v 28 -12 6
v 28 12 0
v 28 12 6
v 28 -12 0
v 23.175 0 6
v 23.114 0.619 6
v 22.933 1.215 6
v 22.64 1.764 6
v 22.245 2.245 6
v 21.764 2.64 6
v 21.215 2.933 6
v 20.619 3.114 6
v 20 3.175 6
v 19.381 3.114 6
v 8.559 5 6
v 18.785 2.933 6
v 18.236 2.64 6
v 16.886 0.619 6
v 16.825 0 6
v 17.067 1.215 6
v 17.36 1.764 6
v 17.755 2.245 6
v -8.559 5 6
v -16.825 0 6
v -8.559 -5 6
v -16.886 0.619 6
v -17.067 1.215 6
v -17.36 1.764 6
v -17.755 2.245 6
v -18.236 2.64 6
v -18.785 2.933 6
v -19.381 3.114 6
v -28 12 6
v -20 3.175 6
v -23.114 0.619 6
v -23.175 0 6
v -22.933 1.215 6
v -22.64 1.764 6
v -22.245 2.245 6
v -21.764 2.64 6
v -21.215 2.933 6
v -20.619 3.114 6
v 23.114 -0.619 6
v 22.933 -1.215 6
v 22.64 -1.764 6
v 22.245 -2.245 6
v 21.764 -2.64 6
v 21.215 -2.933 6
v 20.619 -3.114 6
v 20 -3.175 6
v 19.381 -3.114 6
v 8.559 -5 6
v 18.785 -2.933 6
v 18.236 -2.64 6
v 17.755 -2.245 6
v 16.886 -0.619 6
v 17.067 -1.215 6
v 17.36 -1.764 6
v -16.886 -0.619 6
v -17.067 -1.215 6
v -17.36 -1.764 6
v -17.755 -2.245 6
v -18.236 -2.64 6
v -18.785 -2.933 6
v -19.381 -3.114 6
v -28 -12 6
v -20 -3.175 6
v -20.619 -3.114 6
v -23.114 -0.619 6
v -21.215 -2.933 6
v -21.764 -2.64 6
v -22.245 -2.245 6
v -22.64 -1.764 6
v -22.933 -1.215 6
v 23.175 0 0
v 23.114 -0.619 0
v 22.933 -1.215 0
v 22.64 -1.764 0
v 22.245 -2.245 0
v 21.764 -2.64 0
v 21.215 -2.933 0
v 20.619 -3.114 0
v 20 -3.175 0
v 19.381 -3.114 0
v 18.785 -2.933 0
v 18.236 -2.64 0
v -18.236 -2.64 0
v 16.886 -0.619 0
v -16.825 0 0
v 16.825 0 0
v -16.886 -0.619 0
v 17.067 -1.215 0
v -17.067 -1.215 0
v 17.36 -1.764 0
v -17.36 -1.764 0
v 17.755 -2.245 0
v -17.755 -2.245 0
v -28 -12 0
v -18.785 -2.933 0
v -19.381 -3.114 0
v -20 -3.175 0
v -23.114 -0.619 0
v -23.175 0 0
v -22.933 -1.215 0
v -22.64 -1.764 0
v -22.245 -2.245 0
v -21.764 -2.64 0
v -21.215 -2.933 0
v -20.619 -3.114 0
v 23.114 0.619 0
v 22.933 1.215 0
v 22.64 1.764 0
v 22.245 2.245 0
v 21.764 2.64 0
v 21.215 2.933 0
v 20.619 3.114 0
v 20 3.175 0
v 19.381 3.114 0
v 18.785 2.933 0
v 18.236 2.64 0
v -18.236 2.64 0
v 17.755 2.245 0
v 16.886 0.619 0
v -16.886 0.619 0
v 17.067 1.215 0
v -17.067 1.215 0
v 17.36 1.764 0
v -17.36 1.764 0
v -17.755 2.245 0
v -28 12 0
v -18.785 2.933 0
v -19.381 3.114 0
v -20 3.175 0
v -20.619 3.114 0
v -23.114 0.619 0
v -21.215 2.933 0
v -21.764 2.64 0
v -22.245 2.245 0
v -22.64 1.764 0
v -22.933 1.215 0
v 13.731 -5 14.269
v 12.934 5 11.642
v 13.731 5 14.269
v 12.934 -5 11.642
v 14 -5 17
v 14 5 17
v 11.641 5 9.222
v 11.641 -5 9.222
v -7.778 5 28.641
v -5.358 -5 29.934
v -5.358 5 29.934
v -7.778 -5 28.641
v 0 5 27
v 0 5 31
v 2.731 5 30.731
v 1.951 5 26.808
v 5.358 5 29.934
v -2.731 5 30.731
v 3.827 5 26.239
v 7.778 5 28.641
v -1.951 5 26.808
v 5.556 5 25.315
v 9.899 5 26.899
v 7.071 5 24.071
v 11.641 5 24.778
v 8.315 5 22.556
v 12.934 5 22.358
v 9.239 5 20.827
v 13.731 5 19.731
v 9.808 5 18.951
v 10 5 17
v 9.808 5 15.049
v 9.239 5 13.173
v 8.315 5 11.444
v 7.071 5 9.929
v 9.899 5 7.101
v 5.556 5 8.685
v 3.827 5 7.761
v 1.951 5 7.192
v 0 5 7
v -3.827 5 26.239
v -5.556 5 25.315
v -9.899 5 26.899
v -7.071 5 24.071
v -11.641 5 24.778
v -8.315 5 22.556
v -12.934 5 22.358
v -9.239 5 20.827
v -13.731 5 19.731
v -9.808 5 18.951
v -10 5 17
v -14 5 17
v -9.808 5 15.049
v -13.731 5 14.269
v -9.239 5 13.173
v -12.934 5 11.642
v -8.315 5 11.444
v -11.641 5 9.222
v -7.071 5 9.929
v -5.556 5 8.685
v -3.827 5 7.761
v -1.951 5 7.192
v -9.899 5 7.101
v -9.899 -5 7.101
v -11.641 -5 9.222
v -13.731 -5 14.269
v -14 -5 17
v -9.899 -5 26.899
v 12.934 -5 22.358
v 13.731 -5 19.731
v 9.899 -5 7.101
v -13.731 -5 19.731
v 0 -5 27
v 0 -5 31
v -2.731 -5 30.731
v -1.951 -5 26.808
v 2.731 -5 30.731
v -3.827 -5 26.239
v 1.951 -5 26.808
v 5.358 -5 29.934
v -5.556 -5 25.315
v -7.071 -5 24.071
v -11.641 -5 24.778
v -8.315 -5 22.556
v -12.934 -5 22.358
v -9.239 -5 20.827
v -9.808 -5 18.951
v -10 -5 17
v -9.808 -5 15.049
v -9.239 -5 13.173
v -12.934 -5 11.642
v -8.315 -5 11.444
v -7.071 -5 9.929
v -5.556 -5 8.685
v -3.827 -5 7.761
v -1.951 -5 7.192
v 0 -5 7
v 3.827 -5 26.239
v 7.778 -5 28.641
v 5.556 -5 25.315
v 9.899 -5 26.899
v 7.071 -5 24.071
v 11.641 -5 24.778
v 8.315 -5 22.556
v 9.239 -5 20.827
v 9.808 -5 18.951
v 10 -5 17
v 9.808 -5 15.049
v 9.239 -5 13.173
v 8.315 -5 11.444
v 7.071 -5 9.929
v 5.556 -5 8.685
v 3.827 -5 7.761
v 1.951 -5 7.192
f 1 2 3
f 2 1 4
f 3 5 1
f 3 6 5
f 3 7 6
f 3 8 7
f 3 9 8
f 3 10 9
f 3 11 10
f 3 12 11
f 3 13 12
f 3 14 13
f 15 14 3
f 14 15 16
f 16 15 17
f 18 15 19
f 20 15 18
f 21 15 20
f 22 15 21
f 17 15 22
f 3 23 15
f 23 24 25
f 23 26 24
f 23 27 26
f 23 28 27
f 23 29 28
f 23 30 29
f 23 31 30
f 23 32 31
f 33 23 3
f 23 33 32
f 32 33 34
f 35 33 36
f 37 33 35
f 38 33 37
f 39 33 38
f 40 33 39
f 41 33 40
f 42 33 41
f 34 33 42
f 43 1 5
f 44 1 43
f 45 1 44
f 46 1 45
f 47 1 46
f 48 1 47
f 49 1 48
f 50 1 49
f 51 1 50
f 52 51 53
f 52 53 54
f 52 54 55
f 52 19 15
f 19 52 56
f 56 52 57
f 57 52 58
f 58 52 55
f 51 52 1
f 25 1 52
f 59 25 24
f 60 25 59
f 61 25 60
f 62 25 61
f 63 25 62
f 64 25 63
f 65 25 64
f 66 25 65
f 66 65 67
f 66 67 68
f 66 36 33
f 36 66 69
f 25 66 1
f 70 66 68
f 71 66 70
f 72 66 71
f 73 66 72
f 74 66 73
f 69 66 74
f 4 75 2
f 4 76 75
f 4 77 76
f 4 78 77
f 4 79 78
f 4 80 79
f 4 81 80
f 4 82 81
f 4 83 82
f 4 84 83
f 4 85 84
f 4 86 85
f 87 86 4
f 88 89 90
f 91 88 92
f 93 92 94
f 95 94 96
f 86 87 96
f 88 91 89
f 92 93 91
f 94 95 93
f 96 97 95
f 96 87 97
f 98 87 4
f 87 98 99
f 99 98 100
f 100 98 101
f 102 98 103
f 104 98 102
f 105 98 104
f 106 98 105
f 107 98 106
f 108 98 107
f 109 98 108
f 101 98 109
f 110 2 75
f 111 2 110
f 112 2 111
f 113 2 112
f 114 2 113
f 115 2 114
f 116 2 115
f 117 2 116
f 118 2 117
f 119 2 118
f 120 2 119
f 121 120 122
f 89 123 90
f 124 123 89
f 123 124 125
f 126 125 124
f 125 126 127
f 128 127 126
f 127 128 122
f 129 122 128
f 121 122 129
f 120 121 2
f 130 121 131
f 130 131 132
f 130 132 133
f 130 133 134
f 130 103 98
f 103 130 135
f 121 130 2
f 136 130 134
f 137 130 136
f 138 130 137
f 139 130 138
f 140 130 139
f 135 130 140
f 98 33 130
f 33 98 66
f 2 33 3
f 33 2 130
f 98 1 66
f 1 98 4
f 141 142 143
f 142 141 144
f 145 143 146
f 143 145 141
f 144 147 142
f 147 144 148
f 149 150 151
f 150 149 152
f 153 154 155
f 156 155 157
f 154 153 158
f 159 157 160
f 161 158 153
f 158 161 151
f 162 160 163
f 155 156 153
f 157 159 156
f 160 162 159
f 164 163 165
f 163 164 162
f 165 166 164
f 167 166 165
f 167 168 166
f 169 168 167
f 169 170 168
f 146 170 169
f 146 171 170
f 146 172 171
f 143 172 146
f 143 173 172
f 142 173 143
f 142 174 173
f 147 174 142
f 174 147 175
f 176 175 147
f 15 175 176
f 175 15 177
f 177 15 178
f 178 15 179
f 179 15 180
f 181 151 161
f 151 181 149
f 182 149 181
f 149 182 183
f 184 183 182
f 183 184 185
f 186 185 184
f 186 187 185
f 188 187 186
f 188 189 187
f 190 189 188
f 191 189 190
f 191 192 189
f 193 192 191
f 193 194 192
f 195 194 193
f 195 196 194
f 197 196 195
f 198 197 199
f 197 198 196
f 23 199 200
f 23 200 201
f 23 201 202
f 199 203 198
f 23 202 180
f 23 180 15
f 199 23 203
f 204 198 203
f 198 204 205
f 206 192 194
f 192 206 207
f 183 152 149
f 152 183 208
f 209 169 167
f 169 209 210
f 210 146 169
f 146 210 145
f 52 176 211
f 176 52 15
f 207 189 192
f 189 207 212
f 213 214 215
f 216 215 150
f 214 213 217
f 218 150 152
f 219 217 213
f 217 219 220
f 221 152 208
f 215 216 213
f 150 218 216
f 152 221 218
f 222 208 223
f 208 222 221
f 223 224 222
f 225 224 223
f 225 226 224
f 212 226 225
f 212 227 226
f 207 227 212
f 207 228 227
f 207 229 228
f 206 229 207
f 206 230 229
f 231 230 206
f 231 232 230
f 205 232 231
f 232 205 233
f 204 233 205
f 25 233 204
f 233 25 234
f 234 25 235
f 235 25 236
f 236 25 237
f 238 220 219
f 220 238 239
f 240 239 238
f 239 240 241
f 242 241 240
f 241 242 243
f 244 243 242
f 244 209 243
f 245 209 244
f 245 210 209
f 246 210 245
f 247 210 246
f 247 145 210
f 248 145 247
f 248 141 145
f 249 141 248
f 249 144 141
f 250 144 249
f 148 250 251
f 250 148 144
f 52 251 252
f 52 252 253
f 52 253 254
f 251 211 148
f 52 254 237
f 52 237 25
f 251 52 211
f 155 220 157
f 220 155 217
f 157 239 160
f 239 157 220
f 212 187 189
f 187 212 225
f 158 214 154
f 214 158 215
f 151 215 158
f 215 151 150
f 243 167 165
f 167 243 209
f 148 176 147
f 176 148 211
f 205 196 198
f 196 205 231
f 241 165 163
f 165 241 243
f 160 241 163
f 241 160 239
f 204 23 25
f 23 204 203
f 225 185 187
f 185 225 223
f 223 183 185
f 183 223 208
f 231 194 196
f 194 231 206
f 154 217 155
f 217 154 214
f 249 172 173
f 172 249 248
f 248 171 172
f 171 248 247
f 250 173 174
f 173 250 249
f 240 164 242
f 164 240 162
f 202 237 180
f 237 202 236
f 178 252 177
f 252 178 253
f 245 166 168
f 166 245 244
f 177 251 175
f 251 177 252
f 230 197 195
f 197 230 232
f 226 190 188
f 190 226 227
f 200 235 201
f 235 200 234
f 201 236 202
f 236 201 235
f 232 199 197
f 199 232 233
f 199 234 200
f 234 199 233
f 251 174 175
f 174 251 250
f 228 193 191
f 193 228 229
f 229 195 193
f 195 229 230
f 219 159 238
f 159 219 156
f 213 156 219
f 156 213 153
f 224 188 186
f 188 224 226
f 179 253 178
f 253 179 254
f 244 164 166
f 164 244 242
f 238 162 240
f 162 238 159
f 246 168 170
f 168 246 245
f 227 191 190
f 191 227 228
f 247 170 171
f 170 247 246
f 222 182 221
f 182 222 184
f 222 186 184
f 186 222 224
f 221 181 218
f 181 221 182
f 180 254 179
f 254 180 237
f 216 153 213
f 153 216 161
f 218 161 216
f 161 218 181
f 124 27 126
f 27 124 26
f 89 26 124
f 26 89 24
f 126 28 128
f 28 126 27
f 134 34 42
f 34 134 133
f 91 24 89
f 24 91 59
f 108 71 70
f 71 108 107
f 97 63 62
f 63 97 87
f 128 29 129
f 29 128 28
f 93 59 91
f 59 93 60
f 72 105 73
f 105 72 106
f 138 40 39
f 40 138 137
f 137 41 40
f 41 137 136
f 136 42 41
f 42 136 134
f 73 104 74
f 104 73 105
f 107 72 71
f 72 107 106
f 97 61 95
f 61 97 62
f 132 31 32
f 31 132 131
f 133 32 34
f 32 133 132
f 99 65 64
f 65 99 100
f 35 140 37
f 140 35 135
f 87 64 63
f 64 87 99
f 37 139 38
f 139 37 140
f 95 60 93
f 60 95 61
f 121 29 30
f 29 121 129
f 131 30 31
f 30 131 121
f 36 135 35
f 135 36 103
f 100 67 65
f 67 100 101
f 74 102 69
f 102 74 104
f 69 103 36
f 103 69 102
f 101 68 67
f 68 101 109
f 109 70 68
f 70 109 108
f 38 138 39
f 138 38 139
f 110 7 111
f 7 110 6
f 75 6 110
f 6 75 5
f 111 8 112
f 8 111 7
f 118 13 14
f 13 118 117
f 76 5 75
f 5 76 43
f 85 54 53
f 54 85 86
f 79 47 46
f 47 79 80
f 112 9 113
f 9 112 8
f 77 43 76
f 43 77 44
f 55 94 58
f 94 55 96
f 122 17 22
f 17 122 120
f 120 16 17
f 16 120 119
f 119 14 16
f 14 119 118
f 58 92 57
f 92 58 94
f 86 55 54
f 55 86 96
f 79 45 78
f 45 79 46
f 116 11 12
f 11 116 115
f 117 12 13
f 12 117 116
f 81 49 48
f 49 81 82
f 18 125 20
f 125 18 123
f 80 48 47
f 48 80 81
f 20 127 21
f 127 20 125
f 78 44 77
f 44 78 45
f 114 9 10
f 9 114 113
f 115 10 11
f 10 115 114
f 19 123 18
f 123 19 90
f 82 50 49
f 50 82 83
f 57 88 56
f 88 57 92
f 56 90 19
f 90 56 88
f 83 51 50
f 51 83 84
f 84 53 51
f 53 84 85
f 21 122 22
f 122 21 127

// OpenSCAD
$fn = 32;

// ----------------------------------------------------------------------
// Deck eye: 28 mm eye on a 56 mm base
// ----------------------------------------------------------------------

// --- parameters (mm) ---
base_l = 56;              // base length
base_w = 24;              // base width
base_t = 6;               // base thickness
eye_r = 14;               // eye outside radius
eye_bore = 20;            // eye bore diameter
eye_w = 10;               // eye thickness
eye_z = 17;               // eye centre height
holes_d = 6.35;           // fixing holes
hole_x = 20;              // fixing hole spacing

difference() {
  union() {
    translate([-28, -12, 0]) cube([base_l, base_w, base_t]);
    /* eye standing upright, its foot sunk 3 mm into the base */
    translate([0, -5, 17]) rotate([-90, 0, 0]) cylinder(h = 10, d = 28);
  }
  /* eye bore, 2.5 mm clear of both faces */
  translate([0, -7.5, 17]) rotate([-90, 0, 0]) cylinder(h = 15, d = 20);
  translate([-20, 0, -2.5]) cylinder(h = base_t + 5, d = holes_d);
  translate([20, 0, -2.5]) cylinder(h = base_t + 5, d = holes_d);
}
